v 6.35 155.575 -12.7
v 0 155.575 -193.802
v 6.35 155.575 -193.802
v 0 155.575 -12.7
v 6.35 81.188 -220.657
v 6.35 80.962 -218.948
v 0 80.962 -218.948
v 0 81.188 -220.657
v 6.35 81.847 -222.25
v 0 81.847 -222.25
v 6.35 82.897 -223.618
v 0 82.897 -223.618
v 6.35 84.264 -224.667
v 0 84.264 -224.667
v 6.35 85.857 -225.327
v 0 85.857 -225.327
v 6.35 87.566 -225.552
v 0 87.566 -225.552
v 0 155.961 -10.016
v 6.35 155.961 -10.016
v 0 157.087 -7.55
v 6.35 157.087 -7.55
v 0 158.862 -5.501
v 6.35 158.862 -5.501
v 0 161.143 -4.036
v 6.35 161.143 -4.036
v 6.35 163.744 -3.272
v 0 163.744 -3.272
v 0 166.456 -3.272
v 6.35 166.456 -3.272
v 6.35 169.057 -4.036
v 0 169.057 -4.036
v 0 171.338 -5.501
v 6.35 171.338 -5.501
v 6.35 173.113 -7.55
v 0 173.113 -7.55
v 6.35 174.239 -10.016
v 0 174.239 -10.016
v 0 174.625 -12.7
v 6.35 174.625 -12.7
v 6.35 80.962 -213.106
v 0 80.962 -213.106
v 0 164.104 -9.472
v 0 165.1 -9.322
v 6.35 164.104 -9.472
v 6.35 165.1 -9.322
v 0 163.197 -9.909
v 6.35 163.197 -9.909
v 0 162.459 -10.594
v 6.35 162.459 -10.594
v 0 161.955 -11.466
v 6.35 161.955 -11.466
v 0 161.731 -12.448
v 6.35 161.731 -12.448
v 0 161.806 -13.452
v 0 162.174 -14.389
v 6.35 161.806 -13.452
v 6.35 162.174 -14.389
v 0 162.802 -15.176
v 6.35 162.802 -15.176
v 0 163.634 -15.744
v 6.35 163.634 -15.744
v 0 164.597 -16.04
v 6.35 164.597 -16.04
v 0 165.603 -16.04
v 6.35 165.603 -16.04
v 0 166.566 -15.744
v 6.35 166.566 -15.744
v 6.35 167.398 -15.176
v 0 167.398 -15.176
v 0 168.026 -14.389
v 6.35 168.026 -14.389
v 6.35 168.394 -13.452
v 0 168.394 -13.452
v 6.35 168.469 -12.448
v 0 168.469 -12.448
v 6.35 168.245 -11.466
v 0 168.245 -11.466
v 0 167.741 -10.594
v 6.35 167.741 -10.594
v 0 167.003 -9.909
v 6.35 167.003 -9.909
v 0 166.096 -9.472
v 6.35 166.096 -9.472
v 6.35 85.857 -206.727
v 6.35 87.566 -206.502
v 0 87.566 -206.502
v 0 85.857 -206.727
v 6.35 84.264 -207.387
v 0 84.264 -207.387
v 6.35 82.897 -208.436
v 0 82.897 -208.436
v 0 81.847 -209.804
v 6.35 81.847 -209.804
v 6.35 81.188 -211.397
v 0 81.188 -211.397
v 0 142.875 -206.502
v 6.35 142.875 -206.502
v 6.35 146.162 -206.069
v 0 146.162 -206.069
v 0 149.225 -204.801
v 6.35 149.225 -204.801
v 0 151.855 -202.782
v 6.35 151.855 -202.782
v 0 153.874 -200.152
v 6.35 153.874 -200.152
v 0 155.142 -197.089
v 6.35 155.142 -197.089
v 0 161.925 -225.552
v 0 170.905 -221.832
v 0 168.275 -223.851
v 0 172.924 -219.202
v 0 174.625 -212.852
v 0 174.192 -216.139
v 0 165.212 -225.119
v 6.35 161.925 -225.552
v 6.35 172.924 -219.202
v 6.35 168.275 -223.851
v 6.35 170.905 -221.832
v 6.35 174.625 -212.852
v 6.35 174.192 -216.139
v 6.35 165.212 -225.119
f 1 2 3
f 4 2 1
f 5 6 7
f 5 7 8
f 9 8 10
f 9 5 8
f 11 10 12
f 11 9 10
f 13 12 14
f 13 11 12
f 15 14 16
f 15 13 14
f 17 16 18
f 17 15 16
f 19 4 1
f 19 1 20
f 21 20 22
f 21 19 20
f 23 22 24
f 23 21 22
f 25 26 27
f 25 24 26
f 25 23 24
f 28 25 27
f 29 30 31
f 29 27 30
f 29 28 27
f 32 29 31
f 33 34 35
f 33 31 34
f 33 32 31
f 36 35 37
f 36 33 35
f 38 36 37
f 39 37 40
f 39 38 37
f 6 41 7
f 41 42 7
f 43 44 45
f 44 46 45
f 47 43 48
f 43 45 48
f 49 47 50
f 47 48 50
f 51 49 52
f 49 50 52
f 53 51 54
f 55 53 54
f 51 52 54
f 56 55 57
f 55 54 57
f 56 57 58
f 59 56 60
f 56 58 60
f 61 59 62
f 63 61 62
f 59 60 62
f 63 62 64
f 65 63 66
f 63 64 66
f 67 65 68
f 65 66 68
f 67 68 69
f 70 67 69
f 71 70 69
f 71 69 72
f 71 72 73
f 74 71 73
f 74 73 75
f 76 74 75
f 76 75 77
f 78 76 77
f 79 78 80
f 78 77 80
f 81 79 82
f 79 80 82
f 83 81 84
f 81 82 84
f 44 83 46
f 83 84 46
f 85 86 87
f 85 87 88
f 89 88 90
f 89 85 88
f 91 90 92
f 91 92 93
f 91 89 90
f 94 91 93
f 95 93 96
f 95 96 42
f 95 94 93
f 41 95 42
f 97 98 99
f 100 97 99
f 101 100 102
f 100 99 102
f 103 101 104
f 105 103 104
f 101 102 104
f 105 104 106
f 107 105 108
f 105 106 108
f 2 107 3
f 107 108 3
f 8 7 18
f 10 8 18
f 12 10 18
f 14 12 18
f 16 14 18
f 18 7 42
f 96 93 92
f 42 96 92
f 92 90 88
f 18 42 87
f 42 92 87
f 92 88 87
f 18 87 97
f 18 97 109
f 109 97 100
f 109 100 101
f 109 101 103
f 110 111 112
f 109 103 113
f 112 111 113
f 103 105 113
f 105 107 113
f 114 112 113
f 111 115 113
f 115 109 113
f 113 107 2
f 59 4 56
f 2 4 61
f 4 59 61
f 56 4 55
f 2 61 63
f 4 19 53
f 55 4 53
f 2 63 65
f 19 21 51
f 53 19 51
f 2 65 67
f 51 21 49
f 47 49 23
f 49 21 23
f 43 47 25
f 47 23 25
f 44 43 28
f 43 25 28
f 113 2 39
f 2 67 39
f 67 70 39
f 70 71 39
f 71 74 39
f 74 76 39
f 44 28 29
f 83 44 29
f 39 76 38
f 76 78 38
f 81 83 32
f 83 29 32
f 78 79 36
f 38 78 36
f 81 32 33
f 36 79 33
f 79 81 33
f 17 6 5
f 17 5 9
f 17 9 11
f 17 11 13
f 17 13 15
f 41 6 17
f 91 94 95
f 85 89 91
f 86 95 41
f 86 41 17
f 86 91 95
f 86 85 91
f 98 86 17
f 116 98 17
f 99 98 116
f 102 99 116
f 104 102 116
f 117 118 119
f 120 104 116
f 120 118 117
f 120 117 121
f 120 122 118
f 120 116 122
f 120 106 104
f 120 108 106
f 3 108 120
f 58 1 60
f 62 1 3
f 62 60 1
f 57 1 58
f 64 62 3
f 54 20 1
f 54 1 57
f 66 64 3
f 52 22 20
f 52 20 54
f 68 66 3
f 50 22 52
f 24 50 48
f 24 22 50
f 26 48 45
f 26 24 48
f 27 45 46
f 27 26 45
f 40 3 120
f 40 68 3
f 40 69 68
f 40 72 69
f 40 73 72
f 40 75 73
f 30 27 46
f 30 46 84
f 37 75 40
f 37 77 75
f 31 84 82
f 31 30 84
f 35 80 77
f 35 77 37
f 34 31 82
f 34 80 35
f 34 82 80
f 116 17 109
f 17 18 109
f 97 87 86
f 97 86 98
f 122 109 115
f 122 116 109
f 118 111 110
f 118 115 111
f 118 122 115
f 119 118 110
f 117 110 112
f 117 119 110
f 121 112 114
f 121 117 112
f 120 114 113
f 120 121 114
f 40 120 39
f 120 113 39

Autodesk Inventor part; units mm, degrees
ref_plane "YZ Plane" through (0, 0, 0) normal (1, 0, 0) x (0, 1, 0)
ref_plane "XZ Plane" through (0, 0, 0) normal (0, 1, 0) x (-1, 0, 0)
ref_plane "XY Plane" through (0, 0, 0) normal (0, 0, 1) x (1, 0, 0)
sketch "Sketch1" plane through (0, 0, 0) normal (1, 0, 0) x (0, 1, 0)
  line L0 (0, 0) -> (50.8, 0) construction
  line L1 (50.8, 0) -> (50.8, -25.4) construction
  line L2 (50.8, -25.4) -> (0, -25.4) construction
  line L3 (0, -25.4) -> (0, 0) construction
  line L4 (12.7, -25.4) -> (139.7, -25.4) construction
  line L5 (139.7, -25.4) -> (139.7, -111.252) construction
  line L6 (139.7, -111.252) -> (12.7, -111.252) construction
  line L7 (12.7, -111.252) -> (12.7, -25.4) construction
  line L8 (80.9625, -111.252) -> (665.1625, -111.252) construction
  line L9 (665.1625, -111.252) -> (665.1625, -320.802) construction
  line L10 (665.1625, -320.802) -> (80.9625, -320.802) construction
  line L11 (80.9625, -320.802) -> (80.9625, -111.252) construction
  point P0 (0, -12.7)
  dimension "d0" = 50.8
  dimension "d1" = 25.4
  dimension "d2" = 12.7
  dimension "d3" = 85.852
  dimension "d4" = 127
  dimension "d5" = 80.9625
  dimension "d6" = 209.55
  dimension "d7" = 584.2
sketch "Sketch2" plane through (0, 0, 0) normal (1, 0, 0) x (0, 1, 0)
  line L0 (139.7, -25.4) -> (139.7, -111.252) construction
  line L1 (80.9625, -320.802) -> (80.9625, -111.252) construction
  line L2 (139.7, -111.252) -> (12.7, -111.252) construction
  line L3 (50.8, 0) -> (50.8, -25.4) construction
  line L4 (12.7, -25.4) -> (139.7, -25.4) construction
  line L5 (12.7, -111.252) -> (12.7, -25.4) construction
  line L6 (50.8, -25.4) -> (0, -25.4) construction
  line L7 (0, -25.4) -> (0, 0) construction
  line L8 (0, 0) -> (50.8, 0) construction
  line L9 (665.1625, -320.802) -> (80.9625, -320.802) construction
  line L10 (80.9625, -111.252) -> (665.1625, -111.252) construction
  line L11 (665.1625, -111.252) -> (665.1625, -320.802) construction
  line L12 (50.8, -25.4) -> (190.5, -25.4) construction
  line L13 (190.5, -25.4) -> (190.5, 0) construction
  line L14 (190.5, 0) -> (50.8, 0) construction
  line L15 (50.8, 0) -> (50.8, -25.4) construction
  line L16 (165.1, -12.7) -> (165.1, -216.027) construction
  line L17 (165.1, -216.027) -> (80.9625, -216.027) construction
  line L18 (80.9625, -225.552) -> (174.625, -225.552)
  line L19 (174.625, -225.552) -> (174.625, -12.7)
  line L20 (80.9625, -206.502) -> (155.575, -206.502)
  line L21 (155.575, -206.502) -> (155.575, -12.7)
  line L22 (80.9625, -206.502) -> (80.9625, -225.552)
  arc A0 (174.625, -12.7) -> (155.575, -12.7) centre (165.1, -12.7) ccw
  point P0 (0, -12.7)
  point P1 (190.5, -12.7)
  dimension "d8" = 50.8
  dimension "d9" = 25.4
  dimension "d10" = 9.525
  dimension "d11" = 9.525
  dimension "d12" = 139.7
extrude "Extrusion1" add sketch "Sketch2" along normal blind 6.35
fillet "Fillet1" radius 12.7 2 edges at (3.175, 155.575, -206.502) (3.175, 174.625, -225.552)
fillet "Fillet2" radius 6.604 2 edges at (3.175, 80.9625, -225.552) (3.175, 80.9625, -206.502)
hole "Hole1" at (0, 139.7, -111.252) at (0, 139.7, -25.4) at (0, 80.9625, -111.252) at (0, 80.9625, -320.802) at (0, 50.8, -25.4) at (0, 12.7, -111.252) at (0, 50.8, 0) at (0, 0, -25.4) at (0, 0, -12.7) at (0, 165.1, -12.7) direction (1, 0, 0) diameter 6.7564 end through all clearance for "Flat Head Machine Screw (82)" size "1/4" standard "Ansi Unified Screw Threads"
properties part number "CHD-002" material "Aluminum 6061"
